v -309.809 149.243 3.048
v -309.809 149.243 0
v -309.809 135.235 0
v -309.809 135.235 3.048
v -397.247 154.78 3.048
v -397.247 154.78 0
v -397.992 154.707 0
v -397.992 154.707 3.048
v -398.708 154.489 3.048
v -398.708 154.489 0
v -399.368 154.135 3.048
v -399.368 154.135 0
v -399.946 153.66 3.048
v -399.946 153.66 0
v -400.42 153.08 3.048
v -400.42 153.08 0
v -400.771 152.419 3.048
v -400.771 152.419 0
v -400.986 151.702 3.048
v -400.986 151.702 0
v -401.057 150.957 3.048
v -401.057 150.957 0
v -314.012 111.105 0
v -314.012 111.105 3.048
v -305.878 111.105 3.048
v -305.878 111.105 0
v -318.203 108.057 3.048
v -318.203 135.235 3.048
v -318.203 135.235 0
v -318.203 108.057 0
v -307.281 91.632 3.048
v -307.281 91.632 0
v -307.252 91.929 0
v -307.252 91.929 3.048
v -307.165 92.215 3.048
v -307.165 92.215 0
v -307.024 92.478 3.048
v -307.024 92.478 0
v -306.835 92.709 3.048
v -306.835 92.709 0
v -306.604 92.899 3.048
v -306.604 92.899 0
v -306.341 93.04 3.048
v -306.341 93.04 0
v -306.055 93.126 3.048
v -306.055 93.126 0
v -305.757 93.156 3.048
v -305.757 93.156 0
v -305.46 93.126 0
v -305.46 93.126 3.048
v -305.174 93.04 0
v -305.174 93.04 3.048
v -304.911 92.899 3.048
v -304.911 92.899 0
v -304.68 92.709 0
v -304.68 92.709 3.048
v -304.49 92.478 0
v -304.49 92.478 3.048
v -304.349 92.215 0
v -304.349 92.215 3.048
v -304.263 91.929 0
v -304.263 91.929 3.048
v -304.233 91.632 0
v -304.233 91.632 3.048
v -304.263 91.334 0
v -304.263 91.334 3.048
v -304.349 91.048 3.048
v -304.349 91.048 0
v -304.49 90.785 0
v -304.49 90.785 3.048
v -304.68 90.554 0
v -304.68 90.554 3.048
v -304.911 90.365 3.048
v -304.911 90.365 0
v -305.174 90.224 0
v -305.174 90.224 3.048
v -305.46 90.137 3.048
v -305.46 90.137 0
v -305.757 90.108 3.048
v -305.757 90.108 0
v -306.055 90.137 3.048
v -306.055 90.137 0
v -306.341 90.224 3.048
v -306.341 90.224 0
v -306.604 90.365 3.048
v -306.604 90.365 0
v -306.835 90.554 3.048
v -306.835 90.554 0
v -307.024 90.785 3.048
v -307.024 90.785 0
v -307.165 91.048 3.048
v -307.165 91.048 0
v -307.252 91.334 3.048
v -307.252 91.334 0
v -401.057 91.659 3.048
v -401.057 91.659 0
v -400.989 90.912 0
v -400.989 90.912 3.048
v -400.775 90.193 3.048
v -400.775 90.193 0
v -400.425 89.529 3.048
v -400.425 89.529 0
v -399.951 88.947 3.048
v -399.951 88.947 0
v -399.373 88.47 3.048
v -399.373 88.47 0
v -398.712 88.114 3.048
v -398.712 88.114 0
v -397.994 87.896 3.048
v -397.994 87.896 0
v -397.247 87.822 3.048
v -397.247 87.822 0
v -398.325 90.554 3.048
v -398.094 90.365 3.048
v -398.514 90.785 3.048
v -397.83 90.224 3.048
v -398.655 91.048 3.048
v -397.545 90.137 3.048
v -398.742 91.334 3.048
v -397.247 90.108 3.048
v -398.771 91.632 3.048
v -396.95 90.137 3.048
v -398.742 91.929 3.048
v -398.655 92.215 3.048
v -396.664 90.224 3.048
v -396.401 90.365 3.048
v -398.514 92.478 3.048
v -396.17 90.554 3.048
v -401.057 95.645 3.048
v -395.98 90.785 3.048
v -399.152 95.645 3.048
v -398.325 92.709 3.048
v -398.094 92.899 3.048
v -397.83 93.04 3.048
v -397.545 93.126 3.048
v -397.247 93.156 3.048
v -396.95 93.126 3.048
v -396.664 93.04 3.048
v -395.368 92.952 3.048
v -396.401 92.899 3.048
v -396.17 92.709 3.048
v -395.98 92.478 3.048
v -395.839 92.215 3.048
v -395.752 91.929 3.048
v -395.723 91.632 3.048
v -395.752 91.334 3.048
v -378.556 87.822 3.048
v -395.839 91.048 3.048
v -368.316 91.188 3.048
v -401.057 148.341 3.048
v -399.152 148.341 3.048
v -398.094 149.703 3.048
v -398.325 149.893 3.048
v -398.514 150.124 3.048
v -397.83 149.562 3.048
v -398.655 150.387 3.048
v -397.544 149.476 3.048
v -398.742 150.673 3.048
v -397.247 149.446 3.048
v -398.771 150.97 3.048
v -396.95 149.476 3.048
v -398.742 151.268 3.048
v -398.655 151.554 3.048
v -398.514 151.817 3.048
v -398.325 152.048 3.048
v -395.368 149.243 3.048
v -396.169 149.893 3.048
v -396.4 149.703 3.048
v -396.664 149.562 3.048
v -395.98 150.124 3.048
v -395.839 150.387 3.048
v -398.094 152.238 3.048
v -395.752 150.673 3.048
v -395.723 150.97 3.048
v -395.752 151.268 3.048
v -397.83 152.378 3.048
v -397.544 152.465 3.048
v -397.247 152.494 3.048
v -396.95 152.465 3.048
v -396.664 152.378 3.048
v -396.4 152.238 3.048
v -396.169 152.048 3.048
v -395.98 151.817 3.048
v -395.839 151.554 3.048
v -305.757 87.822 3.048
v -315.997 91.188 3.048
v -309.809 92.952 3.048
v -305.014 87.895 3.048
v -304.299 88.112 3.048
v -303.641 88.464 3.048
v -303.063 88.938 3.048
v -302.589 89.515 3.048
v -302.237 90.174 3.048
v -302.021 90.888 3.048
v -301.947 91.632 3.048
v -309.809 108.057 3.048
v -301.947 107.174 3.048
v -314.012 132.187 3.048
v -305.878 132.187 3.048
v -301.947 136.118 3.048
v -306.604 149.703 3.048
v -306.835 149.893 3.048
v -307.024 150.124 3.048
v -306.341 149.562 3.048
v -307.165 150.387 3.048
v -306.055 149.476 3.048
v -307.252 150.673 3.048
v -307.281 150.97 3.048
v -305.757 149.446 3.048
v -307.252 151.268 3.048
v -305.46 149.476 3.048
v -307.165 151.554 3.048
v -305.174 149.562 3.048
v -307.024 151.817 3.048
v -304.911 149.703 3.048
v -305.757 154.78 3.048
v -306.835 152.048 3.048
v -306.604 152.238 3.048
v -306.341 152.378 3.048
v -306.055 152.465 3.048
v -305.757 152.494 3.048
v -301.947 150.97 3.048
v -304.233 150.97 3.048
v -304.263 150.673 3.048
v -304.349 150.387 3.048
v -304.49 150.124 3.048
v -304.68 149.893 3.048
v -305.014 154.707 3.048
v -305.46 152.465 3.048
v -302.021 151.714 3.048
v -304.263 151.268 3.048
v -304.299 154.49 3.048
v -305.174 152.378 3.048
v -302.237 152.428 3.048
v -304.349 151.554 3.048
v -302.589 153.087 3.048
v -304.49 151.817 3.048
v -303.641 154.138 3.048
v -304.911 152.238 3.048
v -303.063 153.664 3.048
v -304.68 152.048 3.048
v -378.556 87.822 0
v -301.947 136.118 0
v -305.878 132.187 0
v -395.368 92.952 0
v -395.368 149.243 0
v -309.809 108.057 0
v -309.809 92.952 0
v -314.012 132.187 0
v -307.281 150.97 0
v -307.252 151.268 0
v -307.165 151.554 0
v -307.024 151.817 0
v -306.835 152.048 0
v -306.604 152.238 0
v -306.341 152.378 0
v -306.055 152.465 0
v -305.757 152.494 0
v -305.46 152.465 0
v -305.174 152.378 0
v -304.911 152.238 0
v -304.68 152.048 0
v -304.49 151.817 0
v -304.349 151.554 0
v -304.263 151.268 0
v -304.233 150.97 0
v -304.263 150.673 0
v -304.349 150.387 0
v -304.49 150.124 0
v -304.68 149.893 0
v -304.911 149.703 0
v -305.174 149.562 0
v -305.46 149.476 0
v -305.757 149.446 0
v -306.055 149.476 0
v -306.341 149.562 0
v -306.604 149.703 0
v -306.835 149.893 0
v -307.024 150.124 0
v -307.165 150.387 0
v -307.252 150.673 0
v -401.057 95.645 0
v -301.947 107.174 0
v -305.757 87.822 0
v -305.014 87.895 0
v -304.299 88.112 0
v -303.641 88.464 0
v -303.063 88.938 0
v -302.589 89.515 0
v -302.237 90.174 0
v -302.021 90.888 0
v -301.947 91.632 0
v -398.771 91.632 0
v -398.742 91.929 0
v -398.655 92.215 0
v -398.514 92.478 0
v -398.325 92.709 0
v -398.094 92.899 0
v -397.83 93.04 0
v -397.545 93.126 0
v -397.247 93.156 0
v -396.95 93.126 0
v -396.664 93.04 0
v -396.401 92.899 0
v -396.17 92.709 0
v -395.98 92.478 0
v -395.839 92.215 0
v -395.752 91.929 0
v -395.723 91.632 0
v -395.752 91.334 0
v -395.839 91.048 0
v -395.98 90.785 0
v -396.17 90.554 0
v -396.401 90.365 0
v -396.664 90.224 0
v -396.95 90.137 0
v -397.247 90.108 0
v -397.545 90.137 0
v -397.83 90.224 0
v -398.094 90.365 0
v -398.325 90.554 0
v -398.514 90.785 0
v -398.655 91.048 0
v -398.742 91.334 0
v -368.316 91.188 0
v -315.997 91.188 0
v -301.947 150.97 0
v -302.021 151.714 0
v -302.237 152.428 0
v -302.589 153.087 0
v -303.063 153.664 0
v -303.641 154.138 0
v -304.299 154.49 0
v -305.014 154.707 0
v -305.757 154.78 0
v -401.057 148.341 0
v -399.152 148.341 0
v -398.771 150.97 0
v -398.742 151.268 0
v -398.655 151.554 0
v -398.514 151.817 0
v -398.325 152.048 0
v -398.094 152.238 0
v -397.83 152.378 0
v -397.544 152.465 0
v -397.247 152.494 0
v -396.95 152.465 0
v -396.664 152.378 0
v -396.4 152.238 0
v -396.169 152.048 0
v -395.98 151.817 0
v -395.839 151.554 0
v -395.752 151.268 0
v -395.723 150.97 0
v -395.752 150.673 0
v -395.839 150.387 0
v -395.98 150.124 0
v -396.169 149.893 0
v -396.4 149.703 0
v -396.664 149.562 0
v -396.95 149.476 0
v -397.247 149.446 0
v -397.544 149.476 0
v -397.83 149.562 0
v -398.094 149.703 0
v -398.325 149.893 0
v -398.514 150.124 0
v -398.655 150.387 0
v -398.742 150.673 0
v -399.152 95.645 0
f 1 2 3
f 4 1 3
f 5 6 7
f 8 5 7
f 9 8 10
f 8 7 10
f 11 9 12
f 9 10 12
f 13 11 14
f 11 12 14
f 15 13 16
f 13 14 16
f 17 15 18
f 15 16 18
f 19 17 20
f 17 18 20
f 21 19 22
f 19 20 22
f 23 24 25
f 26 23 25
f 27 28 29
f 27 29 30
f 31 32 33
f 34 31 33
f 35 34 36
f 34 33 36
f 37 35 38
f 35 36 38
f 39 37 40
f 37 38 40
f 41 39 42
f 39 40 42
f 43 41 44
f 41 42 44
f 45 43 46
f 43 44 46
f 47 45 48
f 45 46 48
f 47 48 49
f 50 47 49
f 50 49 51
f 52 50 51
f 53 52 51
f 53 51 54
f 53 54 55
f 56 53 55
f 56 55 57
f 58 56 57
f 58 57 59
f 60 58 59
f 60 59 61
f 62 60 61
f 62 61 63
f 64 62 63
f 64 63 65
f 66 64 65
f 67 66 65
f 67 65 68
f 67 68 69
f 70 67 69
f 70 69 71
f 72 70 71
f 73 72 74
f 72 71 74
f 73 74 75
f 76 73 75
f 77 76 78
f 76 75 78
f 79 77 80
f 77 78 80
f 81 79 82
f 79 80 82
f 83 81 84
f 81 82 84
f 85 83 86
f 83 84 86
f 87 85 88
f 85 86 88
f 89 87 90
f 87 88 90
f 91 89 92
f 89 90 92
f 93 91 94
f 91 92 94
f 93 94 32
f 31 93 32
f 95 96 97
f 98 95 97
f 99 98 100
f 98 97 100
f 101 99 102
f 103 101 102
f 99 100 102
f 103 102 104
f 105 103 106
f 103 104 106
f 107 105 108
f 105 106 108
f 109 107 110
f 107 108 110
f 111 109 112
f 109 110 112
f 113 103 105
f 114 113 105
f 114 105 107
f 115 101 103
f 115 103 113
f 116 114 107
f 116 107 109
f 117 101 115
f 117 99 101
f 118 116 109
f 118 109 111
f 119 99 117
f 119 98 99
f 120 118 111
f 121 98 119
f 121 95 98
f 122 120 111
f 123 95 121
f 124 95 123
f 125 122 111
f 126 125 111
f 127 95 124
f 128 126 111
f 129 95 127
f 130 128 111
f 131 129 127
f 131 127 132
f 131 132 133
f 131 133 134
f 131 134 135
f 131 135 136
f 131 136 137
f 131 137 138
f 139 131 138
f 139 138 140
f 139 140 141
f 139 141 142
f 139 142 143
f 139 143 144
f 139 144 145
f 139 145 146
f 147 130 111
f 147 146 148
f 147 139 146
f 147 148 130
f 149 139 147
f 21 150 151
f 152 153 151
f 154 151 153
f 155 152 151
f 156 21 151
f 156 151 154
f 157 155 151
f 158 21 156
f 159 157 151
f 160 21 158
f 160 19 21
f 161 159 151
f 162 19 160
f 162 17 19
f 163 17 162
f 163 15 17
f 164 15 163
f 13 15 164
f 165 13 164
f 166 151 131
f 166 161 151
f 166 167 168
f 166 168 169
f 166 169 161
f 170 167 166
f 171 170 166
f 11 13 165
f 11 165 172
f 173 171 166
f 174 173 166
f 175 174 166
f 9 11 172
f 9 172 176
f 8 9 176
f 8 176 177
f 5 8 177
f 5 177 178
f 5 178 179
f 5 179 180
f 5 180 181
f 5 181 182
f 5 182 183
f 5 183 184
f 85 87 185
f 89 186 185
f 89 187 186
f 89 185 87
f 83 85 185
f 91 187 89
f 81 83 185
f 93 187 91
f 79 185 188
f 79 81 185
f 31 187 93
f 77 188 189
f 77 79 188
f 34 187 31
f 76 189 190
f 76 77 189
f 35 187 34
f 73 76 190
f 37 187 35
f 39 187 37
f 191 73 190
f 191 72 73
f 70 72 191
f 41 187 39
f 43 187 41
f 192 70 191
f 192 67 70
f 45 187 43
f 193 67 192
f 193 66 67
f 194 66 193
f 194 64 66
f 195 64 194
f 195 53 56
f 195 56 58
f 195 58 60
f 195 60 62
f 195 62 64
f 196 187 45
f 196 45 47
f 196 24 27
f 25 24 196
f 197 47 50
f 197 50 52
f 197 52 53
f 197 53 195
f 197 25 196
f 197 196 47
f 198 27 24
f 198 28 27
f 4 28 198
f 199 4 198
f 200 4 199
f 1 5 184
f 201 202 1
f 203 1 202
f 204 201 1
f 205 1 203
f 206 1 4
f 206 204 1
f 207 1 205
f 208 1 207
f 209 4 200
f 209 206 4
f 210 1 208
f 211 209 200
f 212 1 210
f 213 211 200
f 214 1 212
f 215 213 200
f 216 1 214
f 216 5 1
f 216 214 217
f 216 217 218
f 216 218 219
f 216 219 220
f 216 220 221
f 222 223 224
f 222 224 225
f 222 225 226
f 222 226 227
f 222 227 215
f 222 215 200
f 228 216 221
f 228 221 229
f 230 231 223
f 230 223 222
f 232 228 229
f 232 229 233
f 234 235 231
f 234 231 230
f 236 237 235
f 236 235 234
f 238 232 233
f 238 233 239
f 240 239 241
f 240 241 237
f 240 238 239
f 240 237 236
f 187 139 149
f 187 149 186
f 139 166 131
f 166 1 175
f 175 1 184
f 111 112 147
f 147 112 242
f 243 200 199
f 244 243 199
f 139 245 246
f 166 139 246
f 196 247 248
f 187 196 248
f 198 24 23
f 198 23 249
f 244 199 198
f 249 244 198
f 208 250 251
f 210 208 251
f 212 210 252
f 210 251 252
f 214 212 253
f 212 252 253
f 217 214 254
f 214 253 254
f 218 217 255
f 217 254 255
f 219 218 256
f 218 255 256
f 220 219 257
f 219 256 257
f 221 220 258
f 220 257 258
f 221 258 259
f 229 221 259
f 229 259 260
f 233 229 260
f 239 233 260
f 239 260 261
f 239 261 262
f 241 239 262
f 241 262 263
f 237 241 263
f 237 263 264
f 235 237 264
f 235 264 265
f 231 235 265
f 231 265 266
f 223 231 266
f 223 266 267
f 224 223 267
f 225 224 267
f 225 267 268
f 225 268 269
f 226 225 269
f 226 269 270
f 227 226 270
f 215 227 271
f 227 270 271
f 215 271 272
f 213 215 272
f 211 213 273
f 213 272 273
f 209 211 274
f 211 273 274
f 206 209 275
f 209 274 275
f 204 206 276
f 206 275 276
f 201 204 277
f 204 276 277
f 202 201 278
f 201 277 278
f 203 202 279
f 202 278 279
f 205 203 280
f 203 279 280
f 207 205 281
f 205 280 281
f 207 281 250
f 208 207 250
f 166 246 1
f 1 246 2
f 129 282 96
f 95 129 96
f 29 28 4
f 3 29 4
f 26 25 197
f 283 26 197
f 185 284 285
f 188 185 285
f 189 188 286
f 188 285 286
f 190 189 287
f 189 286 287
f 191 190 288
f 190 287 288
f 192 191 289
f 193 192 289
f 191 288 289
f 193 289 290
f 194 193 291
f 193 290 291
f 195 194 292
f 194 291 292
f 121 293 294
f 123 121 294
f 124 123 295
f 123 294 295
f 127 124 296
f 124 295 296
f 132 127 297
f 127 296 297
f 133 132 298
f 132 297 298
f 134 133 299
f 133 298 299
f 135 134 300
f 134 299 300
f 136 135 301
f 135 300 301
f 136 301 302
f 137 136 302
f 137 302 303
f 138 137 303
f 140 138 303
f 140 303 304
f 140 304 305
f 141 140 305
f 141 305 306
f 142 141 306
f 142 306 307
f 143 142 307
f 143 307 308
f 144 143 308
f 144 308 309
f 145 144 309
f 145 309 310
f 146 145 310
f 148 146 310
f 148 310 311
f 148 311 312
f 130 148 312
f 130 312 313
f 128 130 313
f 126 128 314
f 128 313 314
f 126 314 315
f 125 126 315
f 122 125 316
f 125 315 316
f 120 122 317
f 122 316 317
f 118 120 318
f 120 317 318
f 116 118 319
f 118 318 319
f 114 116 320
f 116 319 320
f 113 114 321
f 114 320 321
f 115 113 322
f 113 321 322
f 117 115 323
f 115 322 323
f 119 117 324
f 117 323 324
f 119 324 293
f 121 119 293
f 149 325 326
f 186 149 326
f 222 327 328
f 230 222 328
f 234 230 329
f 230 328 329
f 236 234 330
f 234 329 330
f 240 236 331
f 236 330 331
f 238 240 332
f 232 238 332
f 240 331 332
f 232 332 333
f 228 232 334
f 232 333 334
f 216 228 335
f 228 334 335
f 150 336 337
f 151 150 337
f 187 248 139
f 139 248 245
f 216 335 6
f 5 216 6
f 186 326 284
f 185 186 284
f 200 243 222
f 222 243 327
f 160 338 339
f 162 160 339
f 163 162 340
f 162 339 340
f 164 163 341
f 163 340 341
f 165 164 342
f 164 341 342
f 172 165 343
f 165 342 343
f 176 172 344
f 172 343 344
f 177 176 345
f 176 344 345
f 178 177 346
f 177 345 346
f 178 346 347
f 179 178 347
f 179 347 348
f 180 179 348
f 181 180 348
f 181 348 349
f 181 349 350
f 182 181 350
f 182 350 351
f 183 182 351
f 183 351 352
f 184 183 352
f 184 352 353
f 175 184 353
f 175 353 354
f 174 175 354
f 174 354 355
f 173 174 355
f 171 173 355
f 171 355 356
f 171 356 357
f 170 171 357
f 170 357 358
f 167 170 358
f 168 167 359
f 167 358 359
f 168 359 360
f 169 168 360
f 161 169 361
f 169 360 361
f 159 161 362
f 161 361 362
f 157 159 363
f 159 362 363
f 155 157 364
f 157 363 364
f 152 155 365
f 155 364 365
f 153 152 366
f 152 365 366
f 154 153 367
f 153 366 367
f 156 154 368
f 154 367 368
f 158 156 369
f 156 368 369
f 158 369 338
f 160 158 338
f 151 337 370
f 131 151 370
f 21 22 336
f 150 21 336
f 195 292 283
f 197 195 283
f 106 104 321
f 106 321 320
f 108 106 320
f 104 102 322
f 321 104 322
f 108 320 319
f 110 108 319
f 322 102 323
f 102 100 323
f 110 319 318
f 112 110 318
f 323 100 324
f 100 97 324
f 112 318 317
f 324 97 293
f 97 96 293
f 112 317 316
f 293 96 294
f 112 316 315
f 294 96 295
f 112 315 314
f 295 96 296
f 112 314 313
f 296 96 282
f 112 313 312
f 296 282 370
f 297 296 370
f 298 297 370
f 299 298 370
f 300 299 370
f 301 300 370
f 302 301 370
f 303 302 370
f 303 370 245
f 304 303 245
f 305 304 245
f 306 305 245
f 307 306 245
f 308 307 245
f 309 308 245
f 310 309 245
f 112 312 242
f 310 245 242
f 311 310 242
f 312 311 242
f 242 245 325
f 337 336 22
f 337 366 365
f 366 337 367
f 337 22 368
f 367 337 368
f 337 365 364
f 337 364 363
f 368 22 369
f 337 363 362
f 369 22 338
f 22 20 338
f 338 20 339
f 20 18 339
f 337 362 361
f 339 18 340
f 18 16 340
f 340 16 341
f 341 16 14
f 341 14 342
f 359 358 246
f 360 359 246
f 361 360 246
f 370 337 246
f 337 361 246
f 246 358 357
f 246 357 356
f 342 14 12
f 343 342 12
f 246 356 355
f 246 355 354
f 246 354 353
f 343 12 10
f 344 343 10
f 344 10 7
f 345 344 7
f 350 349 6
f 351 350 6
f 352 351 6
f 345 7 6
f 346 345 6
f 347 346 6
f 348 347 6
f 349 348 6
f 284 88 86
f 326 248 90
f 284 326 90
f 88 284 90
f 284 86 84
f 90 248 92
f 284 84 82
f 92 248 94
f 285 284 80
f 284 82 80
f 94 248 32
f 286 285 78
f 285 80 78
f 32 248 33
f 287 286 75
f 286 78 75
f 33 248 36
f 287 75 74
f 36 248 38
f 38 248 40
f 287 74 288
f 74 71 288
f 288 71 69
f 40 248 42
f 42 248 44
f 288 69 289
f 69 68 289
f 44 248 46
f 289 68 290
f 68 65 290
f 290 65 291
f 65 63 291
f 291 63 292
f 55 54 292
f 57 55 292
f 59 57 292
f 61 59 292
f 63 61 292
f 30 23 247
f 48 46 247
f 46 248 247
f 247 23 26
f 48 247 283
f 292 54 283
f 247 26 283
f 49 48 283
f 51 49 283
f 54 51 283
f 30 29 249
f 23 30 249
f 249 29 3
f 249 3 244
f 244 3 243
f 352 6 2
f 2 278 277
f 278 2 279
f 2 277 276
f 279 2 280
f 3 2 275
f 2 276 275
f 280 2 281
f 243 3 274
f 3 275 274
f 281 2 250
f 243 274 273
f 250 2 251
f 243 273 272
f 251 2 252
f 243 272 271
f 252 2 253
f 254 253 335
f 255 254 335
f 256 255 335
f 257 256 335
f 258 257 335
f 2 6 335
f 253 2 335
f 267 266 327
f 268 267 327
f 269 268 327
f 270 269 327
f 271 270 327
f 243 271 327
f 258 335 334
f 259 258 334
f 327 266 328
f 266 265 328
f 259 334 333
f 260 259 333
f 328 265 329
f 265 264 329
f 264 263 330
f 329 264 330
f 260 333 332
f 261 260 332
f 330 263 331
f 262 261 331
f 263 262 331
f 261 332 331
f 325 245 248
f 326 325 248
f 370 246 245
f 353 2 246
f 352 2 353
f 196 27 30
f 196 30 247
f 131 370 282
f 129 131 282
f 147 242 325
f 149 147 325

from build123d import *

# Parameters (mm, degrees)
BOSS_EXTRUDE1_DEPTH = 3.048
SKETCH2_R           = 1.355900406
CUT_EXTRUDE1_DEPTH  = 430.898988368
SKETCH3_R           = 1.524
CUT_EXTRUDE2_DEPTH  = 430.898988368
CUT_EXTRUDE3_DEPTH  = 430.898988368
SKETCH4_4_W         = 8.3947
SKETCH4_4_H         = 2.41935
BOSS_EXTRUDE2_DEPTH = 3.048


with BuildPart() as part:
    # Sketch1 → Boss-Extrude1 (new body)
    with BuildSketch(Plane.XY):
        with BuildLine():
            Line((-309.8086, 128.8851), (-305.87795, 128.8851))
            Line((-305.87795, 128.8851), (-301.9473, 132.81575))
            Line((-301.9473, 132.81575), (-301.9473, 150.9704))
            ThreePointArc((-301.9473, 150.9704), (-303.063223164, 153.664476836), (-305.7573, 154.7804))
            Line((-305.7573, 154.7804), (-397.247125, 154.7804))
            ThreePointArc((-397.247125, 154.7804), (-399.946077222, 153.659592612), (-401.0571, 150.956597849))
            Line((-401.0571, 150.956597849), (-401.0571, 148.341))
            Line((-401.0571, 148.341), (-399.1521, 148.341))
            Line((-399.1521, 148.341), (-399.1521, 95.6449))
            Line((-399.1521, 95.6449), (-401.0571, 95.6449))
            Line((-401.0571, 95.6449), (-401.0571, 91.659304166))
            ThreePointArc((-401.0571, 91.659304166), (-399.951018769, 88.947400452), (-397.2472, 87.8217))
            Line((-397.2472, 87.8217), (-378.5565, 87.8217))
            Line((-378.5565, 87.8217), (-368.3165, 91.1883))
            Line((-368.3165, 91.1883), (-315.9973, 91.1883))
            Line((-315.9973, 91.1883), (-305.7573, 87.8217))
            ThreePointArc((-305.7573, 87.8217), (-303.063223164, 88.937623164), (-301.9473, 91.6317))
            Line((-301.9473, 91.6317), (-301.9473, 111.74645))
            Line((-301.9473, 111.74645), (-305.87795, 115.6771))
            Line((-305.87795, 115.6771), (-309.8086, 115.6771))
            Line((-309.8086, 115.6771), (-314.0123, 115.6771))
            Line((-314.0123, 115.6771), (-314.0123, 128.8851))
            Line((-314.0123, 128.8851), (-309.8086, 128.8851))
        make_face()
        Polygon((-395.3675, 92.9525), (-395.3675, 149.2432), (-309.8086, 149.2432), (-309.8086, 132.81575), (-318.2033, 132.81575), (-318.2033, 111.74645), (-309.8086, 111.74645), (-309.8086, 92.9525), align=None, mode=Mode.SUBTRACT)
    extrude(amount=BOSS_EXTRUDE1_DEPTH)

    # Sketch2 → Cut-Extrude1 (cut, through all)
    with BuildSketch(Plane(origin=(0, 0, 0), x_dir=(-1, 0, 0), z_dir=(0, 0, -1))):
        with Locations((305.7573, 150.9704)):
            Circle(SKETCH2_R)
        with Locations((397.247125, 150.9704)):
            Circle(SKETCH2_R)
        with Locations((397.2472, 91.6317)):
            Circle(SKETCH2_R)
        with Locations((305.7573, 91.6317)):
            Circle(SKETCH2_R)
    extrude(amount=-CUT_EXTRUDE1_DEPTH, mode=Mode.SUBTRACT)

    # Sketch3 → Cut-Extrude2 (cut, through all)
    with BuildSketch(Plane(origin=(0, 0, 0), x_dir=(-1, 0, 0), z_dir=(0, 0, -1))):
        with Locations((305.7573, 150.9704)):
            Circle(SKETCH3_R)
        with Locations((397.247125, 150.9704)):
            Circle(SKETCH3_R)
        with Locations((397.2472, 91.6317)):
            Circle(SKETCH3_R)
        with Locations((305.7573, 91.6317)):
            Circle(SKETCH3_R)
    extrude(amount=-CUT_EXTRUDE2_DEPTH, mode=Mode.SUBTRACT)

    # Sketch4 → Cut-Extrude3 (cut, through all)
    with BuildSketch(Plane.XY.offset(3.048)):
        Polygon((-301.9473, 111.74645), (-301.9473, 132.81575), (-305.87795, 128.8851), (-314.0123, 128.8851), (-314.0123, 115.6771), (-305.87795, 115.6771), align=None)
        Polygon((-301.9473, 132.81575), (-301.9473, 136.11775), (-305.87795, 132.1871), (-314.0123, 132.1871), (-314.0123, 128.8851), (-305.87795, 128.8851), align=None)
        Polygon((-301.9473, 107.17445), (-301.9473, 111.74645), (-305.87795, 115.6771), (-314.0123, 115.6771), (-314.0123, 111.74645), (-309.8086, 111.74645), (-309.8086, 111.1051), (-305.87795, 111.1051), align=None)
    extrude(amount=-CUT_EXTRUDE3_DEPTH, mode=Mode.SUBTRACT)

    # Sketch4<4> → Boss-Extrude2 (add)
    with BuildSketch(Plane.XY.offset(3.048)):
        Polygon((-301.9473, 104.12645), (-301.9473, 107.17445), (-305.87795, 111.1051), (-309.8086, 111.1051), (-309.8086, 108.0571), (-305.87795, 108.0571), align=None)
        Polygon((-314.0123, 111.1051), (-314.0123, 111.74645), (-318.2033, 111.74645), (-318.2033, 108.0571), (-309.8086, 108.0571), (-309.8086, 111.1051), align=None)
        with Locations((-314.00595, 134.025425)):
            Rectangle(SKETCH4_4_W, SKETCH4_4_H)
    extrude(amount=-BOSS_EXTRUDE2_DEPTH)


solid = part.part
